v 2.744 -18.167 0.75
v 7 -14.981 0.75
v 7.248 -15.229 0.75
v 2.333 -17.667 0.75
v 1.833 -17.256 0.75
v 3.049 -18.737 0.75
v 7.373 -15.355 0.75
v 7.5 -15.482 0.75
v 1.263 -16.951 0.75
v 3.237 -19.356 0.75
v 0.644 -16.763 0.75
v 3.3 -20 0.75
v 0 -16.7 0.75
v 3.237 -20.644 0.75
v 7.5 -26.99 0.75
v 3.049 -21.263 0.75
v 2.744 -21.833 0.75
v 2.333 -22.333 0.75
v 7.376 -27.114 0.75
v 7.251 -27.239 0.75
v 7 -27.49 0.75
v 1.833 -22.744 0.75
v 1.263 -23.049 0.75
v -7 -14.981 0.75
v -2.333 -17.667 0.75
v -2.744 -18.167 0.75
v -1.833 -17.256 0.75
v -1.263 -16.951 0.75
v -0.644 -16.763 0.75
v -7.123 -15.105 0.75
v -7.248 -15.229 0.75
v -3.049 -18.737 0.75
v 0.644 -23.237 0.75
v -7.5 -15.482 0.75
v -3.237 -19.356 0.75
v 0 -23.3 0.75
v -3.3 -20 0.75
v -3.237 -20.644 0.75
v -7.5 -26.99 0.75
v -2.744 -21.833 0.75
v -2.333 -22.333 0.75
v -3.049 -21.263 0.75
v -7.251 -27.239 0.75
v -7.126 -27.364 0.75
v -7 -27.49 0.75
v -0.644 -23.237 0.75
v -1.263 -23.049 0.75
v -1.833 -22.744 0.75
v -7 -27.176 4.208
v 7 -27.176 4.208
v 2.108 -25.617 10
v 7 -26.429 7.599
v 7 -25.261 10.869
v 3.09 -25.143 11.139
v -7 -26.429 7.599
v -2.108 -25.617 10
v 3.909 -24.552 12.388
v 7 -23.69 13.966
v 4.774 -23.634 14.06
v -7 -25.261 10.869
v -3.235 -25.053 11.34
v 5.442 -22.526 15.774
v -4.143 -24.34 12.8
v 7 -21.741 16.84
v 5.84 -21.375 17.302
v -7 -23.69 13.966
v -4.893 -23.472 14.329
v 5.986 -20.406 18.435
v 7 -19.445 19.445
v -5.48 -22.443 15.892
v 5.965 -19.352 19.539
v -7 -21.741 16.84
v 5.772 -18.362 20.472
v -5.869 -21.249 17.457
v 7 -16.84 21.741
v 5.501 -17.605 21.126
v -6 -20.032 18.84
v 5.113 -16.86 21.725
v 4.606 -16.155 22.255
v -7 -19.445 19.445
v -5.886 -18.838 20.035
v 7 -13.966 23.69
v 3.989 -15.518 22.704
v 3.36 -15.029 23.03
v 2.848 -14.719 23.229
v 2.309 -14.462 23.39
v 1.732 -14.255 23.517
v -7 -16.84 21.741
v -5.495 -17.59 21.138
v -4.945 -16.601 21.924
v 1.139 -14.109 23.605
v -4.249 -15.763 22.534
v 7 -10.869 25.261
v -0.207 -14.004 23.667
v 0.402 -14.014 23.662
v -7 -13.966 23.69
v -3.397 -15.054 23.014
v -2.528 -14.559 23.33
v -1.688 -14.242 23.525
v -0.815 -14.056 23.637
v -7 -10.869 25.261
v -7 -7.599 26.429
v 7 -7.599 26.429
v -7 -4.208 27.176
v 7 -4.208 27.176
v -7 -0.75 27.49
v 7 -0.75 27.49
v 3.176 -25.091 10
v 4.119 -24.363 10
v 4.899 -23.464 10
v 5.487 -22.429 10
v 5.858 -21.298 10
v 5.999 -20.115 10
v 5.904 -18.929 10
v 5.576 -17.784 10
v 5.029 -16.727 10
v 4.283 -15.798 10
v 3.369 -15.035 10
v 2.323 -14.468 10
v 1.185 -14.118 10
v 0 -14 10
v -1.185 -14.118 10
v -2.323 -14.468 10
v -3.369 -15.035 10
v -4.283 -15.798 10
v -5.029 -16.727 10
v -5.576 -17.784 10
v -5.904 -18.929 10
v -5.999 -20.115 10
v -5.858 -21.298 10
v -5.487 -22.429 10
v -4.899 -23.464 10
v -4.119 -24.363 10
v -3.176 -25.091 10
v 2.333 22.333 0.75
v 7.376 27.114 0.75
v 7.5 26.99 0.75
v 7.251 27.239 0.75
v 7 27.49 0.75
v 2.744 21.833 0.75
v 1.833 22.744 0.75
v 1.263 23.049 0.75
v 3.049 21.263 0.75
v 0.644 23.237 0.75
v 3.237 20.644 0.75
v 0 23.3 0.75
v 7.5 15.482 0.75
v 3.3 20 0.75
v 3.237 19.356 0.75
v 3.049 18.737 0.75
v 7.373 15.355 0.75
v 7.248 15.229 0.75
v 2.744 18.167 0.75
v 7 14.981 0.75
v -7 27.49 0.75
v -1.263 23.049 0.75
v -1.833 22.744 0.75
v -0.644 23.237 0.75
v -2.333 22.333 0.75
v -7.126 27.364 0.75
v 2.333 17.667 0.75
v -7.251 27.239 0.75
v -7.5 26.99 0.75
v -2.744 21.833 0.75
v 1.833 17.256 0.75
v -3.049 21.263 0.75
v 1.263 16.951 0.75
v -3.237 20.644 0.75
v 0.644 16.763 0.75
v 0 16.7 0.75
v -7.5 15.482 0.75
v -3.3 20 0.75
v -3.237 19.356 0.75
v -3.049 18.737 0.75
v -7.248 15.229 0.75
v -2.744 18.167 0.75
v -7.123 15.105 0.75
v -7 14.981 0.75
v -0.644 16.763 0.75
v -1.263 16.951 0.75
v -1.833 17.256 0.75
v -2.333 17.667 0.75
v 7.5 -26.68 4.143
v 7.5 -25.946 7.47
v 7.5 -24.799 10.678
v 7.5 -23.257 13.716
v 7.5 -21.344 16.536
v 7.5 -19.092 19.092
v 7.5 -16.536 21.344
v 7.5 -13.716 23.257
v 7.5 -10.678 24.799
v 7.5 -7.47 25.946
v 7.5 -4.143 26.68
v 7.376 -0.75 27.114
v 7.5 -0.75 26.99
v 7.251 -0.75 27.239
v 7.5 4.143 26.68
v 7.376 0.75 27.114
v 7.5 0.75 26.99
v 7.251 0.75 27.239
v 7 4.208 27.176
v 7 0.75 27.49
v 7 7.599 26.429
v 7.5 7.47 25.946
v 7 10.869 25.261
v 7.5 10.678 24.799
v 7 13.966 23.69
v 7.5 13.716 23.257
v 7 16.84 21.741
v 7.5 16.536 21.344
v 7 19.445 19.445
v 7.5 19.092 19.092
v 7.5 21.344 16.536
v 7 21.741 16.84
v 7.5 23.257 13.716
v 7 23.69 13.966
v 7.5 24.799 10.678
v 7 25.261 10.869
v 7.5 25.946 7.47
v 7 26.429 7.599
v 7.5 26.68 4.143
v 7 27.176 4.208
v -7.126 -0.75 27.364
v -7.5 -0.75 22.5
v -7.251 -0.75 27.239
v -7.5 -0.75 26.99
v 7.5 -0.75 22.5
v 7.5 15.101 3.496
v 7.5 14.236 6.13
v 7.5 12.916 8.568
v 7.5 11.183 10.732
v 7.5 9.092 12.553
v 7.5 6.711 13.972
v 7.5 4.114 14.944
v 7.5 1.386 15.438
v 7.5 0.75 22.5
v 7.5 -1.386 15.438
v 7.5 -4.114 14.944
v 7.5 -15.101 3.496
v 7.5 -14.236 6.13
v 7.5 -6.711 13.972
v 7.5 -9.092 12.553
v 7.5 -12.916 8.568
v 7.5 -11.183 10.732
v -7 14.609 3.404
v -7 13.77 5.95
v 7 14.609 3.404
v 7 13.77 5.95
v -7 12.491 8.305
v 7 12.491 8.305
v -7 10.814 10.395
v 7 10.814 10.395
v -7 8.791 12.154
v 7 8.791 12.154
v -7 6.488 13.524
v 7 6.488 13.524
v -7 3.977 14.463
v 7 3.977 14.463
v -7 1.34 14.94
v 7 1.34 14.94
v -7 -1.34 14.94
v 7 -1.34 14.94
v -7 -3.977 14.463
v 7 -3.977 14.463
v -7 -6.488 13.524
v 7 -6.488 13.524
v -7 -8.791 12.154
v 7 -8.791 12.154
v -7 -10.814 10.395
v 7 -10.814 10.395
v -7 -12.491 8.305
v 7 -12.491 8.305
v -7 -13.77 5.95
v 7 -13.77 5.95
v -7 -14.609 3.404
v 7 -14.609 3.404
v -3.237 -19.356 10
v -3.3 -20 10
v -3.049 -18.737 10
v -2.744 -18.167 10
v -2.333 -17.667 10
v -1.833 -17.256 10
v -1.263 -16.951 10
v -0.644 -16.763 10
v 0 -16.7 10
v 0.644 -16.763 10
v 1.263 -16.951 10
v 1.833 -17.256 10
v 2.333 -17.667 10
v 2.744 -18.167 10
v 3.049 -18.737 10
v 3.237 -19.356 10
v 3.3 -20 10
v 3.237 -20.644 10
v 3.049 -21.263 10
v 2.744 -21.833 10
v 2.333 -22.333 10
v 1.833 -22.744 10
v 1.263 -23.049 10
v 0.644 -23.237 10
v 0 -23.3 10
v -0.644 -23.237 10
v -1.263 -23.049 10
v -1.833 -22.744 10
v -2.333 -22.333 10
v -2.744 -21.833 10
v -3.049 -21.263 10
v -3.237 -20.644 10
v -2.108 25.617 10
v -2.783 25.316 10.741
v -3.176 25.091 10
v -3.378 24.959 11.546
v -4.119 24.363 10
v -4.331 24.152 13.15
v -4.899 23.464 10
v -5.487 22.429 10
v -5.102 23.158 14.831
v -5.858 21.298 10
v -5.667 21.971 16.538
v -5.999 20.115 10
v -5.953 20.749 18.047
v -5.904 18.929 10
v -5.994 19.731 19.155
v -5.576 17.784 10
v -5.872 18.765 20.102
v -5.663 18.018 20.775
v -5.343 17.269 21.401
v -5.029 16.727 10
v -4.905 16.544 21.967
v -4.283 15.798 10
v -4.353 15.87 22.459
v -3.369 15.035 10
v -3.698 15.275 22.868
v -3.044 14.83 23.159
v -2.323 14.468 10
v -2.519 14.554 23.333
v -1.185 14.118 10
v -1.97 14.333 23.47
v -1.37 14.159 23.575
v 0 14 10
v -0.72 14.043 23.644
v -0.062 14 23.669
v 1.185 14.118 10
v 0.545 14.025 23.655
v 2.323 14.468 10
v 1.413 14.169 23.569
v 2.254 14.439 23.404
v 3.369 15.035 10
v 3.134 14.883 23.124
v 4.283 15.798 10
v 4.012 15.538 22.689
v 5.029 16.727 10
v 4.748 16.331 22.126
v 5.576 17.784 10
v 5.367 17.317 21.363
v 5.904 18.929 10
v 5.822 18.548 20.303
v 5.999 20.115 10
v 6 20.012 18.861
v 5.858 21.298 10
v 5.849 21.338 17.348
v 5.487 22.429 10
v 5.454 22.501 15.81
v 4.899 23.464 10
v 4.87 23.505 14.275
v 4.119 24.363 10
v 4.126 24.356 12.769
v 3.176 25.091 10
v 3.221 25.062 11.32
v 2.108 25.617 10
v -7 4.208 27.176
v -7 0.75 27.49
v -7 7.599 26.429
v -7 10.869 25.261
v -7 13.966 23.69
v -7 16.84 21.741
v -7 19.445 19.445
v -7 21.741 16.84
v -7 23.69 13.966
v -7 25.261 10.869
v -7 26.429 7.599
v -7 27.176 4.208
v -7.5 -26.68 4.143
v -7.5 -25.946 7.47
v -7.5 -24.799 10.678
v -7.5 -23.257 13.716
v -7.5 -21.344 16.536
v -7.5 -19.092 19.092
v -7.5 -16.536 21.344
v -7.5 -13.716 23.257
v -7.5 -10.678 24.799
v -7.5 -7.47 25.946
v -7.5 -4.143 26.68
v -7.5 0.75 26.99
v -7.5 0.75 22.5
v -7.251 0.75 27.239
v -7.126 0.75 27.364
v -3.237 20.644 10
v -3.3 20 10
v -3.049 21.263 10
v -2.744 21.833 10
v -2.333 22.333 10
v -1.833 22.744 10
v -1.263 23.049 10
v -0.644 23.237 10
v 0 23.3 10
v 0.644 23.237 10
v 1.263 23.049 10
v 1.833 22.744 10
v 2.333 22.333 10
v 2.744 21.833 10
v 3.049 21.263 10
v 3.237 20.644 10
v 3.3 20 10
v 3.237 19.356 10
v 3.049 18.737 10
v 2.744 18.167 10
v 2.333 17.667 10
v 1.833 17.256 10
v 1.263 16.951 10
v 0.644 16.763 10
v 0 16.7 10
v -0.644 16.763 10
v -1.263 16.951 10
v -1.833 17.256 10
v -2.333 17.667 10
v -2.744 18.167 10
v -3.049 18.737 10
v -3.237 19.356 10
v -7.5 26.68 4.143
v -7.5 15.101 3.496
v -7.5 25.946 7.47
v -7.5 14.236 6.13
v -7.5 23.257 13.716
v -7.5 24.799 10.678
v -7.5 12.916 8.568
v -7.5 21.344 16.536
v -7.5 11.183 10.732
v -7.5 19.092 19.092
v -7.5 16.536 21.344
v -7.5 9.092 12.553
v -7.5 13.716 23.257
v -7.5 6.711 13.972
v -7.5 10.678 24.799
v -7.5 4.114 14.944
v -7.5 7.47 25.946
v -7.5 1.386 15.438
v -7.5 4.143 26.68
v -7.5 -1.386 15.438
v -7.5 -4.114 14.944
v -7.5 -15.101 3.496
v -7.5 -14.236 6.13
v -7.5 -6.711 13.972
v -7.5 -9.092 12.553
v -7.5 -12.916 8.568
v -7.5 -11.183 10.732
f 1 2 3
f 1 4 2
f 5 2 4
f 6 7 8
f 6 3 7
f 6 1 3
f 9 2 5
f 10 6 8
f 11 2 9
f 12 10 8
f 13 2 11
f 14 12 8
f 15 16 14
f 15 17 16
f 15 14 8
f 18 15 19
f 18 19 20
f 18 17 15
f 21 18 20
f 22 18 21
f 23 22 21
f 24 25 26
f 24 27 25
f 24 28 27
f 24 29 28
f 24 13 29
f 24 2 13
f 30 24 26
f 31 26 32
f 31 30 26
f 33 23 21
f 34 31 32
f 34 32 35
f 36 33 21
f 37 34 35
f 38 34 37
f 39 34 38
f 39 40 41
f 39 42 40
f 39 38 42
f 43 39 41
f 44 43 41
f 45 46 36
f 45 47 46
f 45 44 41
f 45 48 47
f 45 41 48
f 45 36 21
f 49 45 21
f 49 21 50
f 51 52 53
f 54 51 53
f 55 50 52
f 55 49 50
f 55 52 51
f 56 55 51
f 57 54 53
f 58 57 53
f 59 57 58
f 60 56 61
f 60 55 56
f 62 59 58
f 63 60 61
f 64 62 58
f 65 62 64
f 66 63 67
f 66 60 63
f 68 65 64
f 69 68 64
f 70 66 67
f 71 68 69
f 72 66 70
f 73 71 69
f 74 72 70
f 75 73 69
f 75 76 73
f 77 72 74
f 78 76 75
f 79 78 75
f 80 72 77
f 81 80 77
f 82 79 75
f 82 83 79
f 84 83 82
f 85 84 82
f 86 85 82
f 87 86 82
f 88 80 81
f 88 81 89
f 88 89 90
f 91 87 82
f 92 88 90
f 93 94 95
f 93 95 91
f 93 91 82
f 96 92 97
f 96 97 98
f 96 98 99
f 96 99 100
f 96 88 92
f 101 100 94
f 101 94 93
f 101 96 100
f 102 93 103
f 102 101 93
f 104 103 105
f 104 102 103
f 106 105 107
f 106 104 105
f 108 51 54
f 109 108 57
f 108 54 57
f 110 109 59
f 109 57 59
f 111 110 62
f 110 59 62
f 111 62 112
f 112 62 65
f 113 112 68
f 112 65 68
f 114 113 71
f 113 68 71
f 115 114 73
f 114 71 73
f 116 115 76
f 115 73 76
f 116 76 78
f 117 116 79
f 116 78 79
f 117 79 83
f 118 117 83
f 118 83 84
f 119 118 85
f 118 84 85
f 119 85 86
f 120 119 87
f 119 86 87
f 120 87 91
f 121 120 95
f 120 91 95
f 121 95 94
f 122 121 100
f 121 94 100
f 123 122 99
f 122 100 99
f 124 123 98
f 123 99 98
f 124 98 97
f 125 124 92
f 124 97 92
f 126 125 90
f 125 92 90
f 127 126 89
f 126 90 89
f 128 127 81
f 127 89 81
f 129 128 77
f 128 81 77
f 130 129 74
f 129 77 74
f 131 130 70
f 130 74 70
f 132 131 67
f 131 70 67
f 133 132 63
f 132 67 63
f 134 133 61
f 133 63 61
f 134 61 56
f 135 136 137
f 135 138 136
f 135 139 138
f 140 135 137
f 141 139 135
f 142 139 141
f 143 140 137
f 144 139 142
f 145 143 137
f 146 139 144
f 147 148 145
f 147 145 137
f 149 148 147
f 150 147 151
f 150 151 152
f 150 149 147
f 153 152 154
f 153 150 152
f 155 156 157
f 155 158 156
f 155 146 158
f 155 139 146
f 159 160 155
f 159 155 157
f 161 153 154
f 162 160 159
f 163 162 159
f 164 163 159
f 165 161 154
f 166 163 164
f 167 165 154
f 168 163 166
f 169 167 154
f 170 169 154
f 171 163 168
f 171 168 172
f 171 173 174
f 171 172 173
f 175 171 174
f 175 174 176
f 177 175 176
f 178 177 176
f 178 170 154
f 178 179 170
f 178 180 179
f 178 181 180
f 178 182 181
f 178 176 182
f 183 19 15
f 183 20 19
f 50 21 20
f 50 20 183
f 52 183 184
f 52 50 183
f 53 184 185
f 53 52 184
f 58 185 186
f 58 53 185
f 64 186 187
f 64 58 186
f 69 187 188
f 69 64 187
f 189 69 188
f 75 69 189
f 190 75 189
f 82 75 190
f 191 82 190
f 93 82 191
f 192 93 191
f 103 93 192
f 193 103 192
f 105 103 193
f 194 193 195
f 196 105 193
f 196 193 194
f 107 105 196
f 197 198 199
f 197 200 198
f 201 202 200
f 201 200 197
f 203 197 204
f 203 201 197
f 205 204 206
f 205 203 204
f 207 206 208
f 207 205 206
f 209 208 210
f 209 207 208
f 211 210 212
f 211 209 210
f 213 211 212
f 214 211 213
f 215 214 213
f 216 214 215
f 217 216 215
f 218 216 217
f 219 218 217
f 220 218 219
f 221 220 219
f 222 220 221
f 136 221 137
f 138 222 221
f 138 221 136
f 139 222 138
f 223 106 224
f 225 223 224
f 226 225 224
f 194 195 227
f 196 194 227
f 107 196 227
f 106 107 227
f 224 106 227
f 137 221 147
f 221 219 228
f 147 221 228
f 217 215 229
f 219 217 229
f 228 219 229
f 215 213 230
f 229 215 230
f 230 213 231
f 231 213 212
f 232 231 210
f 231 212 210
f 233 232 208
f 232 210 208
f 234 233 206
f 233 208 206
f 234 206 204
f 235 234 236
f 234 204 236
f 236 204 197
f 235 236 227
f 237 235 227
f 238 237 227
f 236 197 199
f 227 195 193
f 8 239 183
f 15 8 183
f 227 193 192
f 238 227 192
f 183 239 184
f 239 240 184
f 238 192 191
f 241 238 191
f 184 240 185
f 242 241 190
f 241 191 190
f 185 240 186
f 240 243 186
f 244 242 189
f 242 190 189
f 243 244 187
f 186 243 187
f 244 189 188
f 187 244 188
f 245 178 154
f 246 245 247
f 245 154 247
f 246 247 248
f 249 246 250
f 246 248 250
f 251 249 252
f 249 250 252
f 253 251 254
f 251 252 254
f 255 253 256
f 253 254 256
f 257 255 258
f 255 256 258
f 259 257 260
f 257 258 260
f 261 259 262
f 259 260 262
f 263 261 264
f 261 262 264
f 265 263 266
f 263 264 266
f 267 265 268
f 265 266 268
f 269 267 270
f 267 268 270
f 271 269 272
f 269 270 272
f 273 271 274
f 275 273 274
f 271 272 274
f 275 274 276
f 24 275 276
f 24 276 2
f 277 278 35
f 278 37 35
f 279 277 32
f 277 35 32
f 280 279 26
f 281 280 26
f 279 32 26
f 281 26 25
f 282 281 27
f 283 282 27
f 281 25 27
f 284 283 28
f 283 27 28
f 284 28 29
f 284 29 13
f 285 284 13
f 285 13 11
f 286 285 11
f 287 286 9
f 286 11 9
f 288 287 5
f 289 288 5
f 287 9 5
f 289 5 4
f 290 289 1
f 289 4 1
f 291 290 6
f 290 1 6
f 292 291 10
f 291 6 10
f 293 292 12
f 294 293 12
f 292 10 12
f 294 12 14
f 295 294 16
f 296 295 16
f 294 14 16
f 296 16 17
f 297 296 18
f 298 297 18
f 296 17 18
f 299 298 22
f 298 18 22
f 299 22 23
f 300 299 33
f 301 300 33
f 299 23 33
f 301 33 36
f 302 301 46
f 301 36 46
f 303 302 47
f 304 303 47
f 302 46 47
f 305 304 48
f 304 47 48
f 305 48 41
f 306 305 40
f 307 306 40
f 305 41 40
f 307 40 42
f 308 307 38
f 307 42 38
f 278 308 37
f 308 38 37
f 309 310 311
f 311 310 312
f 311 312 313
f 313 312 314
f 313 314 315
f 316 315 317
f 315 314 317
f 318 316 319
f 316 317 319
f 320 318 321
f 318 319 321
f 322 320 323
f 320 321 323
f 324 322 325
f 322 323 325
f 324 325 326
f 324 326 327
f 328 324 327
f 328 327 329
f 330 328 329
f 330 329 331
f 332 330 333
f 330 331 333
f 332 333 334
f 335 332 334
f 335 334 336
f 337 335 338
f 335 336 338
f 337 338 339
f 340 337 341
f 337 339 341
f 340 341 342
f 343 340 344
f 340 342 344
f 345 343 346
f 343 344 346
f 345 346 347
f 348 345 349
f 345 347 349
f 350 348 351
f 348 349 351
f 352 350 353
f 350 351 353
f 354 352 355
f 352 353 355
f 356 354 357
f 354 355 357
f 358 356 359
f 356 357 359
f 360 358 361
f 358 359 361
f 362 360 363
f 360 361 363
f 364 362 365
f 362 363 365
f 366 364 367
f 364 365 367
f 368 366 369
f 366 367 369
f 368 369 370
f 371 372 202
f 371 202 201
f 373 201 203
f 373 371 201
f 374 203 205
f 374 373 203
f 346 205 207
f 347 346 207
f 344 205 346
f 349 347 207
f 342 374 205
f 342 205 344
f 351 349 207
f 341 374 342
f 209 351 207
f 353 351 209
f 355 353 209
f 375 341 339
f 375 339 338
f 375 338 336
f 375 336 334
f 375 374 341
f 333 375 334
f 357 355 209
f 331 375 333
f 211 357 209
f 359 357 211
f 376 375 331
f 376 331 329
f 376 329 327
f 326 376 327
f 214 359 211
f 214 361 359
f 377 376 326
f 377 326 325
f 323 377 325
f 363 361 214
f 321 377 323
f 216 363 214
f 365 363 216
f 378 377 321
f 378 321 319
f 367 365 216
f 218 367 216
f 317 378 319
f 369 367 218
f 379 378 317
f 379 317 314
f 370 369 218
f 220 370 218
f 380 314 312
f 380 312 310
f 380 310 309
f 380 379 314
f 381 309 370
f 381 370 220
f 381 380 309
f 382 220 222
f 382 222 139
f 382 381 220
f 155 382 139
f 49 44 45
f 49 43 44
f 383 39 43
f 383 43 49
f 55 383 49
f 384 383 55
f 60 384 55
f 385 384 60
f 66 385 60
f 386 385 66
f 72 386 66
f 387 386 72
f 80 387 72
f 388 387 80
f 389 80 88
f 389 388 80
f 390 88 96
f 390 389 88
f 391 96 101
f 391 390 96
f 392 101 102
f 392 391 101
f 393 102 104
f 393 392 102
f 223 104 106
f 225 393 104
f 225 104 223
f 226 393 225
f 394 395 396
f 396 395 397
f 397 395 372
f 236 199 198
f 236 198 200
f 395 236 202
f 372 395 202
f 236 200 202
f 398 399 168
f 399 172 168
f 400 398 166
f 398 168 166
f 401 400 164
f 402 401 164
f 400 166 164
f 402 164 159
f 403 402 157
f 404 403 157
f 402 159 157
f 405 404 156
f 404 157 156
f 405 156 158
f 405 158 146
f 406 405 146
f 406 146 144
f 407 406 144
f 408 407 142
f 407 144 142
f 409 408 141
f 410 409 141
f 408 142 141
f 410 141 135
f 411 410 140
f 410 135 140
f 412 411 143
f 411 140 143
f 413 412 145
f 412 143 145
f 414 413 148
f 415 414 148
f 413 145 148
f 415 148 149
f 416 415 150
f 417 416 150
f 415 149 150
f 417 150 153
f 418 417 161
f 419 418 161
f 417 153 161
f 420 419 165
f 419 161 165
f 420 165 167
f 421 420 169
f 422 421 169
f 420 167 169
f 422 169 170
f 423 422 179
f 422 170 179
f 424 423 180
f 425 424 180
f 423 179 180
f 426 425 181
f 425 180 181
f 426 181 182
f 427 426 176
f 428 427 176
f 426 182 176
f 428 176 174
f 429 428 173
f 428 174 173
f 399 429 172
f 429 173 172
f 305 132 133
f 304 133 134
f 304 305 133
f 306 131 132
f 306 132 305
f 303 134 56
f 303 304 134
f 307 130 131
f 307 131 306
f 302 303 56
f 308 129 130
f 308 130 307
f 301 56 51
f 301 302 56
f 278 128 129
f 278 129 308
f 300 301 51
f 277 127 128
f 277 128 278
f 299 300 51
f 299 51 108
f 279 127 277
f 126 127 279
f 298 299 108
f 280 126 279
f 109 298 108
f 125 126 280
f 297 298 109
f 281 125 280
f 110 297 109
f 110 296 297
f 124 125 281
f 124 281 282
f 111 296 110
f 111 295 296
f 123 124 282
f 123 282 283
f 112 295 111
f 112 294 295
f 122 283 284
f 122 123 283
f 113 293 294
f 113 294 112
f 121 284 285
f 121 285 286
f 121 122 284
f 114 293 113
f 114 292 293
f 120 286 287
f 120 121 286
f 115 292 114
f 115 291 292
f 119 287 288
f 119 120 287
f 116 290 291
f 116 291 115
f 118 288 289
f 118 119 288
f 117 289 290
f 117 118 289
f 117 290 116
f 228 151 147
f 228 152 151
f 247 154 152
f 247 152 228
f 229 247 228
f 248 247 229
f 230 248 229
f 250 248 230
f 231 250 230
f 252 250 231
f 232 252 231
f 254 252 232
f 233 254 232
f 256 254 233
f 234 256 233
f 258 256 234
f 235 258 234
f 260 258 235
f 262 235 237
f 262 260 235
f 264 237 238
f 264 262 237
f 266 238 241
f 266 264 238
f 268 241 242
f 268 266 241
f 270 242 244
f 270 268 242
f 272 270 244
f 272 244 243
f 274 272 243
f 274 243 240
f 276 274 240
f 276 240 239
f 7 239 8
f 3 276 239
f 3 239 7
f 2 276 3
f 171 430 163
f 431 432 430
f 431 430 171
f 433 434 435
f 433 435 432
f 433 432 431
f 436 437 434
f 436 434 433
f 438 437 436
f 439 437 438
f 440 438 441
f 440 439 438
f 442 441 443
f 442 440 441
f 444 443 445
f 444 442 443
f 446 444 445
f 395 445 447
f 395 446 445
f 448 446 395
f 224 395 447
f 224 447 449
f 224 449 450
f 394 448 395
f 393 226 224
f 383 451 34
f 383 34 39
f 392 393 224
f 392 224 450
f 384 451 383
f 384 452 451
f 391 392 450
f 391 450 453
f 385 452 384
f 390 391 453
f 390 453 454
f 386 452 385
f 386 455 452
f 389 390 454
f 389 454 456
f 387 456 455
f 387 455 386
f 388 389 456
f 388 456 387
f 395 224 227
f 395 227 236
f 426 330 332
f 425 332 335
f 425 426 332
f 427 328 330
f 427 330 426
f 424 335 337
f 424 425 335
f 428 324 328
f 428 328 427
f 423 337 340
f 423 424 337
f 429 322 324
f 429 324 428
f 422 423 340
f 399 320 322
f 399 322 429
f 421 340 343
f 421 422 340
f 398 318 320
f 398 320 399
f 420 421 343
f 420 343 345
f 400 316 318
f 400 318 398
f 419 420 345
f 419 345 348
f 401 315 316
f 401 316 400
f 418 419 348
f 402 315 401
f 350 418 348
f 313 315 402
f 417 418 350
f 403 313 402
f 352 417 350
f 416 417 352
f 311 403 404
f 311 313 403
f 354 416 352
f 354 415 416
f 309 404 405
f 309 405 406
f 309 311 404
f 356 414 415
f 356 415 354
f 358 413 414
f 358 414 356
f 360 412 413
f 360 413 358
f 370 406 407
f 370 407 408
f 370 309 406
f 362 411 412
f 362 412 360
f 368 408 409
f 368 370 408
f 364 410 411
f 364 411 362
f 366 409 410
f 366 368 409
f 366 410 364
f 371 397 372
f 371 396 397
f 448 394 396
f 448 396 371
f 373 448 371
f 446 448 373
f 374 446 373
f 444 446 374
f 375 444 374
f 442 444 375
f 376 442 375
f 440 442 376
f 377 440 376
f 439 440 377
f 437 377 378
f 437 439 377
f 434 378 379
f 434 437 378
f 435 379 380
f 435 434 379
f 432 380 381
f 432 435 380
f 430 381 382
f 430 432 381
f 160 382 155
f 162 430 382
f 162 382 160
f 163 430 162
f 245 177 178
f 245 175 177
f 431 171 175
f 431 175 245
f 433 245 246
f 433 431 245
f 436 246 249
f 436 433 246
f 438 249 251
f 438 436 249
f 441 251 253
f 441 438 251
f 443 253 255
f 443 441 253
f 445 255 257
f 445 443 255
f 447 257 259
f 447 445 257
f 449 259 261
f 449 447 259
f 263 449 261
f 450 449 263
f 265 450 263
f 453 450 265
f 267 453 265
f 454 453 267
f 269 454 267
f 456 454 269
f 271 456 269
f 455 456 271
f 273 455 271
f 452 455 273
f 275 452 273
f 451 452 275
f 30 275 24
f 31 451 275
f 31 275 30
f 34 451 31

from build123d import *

# Parameters (mm, degrees)
BOSS_EXTRUDE1_DEPTH                     = 15
CUT_EXTRUDE1_DEPTH                      = 42.676582154
CUT_EXTRUDE2_DEPTH                      = 42.669833213
CBORE_FOR_M6_HEX_HEAD_BOLT1_D           = 6.6
CBORE_FOR_M6_HEX_HEAD_BOLT1_CBORE_D     = 12
CBORE_FOR_M6_HEX_HEAD_BOLT1_CBORE_DEPTH = 13.669600757
CHAMFER1_SIZE                           = 0.5


with BuildPart() as part:
    # Sketch1 → Boss-Extrude1 (new body)
    with BuildSketch(Plane(origin=(-7.5, 0, 0), x_dir=(0, -1, 0), z_dir=(-1, 0, 0))):
        with BuildLine():
            Line((-27.489770825, 0.75), (27.489770825, 0.75))
            ThreePointArc((27.489770825, 0.75), (0, 27.5), (-27.489770825, 0.75))
        make_face()
    extrude(amount=-BOSS_EXTRUDE1_DEPTH)

    # Sketch2 → Cut-Extrude1 (cut, through all)
    with BuildSketch(Plane(origin=(7.5, 0, 0), x_dir=(0, 0, -1), z_dir=(1, 0, 0))):
        with BuildLine():
            Line((-27.489770825, -0.75), (-22.5, -0.75))
            Line((-22.5, -0.75), (-22.5, 0.75))
            Line((-22.5, 0.75), (-27.489770825, 0.75))
            ThreePointArc((-27.489770825, 0.75), (-27.5, 0), (-27.489770825, -0.75))
        make_face()
    extrude(amount=-CUT_EXTRUDE1_DEPTH, mode=Mode.SUBTRACT)

    # Sketch3 → Cut-Extrude2 (cut, through all)
    with BuildSketch(Plane(origin=(7.5, 0, 0), x_dir=(0, 0, -1), z_dir=(1, 0, 0))):
        with BuildLine():
            Line((-0.75, -14.981238267), (-0.75, 14.981238267))
            ThreePointArc((-0.75, 14.981238267), (-15, 0), (-0.75, -14.981238267))
        make_face()
    extrude(amount=-CUT_EXTRUDE2_DEPTH, mode=Mode.SUBTRACT)

    # CBORE for M6 Hex Head Bolt1 (through all)
    with Locations(Plane.XY.offset(23.669600757)):
        with Locations((0, -20), (0, 20)):
            CounterBoreHole(CBORE_FOR_M6_HEX_HEAD_BOLT1_D / 2, CBORE_FOR_M6_HEX_HEAD_BOLT1_CBORE_D / 2, CBORE_FOR_M6_HEX_HEAD_BOLT1_CBORE_DEPTH)

    # Chamfer1
    chamfer1_edges = [part.edges().sort_by_distance(p)[0] for p in [
        (7.5, 19.445436483, 19.445436483),
        (-7.5, 0, 15),
        (7.5, 0, 15),
        (-7.5, -19.445436483, 19.445436483),
        (7.5, -19.445436483, 19.445436483),
        (-7.5, 19.445436483, 19.445436483),
    ]]
    chamfer(chamfer1_edges, length=CHAMFER1_SIZE)


solid = part.part
